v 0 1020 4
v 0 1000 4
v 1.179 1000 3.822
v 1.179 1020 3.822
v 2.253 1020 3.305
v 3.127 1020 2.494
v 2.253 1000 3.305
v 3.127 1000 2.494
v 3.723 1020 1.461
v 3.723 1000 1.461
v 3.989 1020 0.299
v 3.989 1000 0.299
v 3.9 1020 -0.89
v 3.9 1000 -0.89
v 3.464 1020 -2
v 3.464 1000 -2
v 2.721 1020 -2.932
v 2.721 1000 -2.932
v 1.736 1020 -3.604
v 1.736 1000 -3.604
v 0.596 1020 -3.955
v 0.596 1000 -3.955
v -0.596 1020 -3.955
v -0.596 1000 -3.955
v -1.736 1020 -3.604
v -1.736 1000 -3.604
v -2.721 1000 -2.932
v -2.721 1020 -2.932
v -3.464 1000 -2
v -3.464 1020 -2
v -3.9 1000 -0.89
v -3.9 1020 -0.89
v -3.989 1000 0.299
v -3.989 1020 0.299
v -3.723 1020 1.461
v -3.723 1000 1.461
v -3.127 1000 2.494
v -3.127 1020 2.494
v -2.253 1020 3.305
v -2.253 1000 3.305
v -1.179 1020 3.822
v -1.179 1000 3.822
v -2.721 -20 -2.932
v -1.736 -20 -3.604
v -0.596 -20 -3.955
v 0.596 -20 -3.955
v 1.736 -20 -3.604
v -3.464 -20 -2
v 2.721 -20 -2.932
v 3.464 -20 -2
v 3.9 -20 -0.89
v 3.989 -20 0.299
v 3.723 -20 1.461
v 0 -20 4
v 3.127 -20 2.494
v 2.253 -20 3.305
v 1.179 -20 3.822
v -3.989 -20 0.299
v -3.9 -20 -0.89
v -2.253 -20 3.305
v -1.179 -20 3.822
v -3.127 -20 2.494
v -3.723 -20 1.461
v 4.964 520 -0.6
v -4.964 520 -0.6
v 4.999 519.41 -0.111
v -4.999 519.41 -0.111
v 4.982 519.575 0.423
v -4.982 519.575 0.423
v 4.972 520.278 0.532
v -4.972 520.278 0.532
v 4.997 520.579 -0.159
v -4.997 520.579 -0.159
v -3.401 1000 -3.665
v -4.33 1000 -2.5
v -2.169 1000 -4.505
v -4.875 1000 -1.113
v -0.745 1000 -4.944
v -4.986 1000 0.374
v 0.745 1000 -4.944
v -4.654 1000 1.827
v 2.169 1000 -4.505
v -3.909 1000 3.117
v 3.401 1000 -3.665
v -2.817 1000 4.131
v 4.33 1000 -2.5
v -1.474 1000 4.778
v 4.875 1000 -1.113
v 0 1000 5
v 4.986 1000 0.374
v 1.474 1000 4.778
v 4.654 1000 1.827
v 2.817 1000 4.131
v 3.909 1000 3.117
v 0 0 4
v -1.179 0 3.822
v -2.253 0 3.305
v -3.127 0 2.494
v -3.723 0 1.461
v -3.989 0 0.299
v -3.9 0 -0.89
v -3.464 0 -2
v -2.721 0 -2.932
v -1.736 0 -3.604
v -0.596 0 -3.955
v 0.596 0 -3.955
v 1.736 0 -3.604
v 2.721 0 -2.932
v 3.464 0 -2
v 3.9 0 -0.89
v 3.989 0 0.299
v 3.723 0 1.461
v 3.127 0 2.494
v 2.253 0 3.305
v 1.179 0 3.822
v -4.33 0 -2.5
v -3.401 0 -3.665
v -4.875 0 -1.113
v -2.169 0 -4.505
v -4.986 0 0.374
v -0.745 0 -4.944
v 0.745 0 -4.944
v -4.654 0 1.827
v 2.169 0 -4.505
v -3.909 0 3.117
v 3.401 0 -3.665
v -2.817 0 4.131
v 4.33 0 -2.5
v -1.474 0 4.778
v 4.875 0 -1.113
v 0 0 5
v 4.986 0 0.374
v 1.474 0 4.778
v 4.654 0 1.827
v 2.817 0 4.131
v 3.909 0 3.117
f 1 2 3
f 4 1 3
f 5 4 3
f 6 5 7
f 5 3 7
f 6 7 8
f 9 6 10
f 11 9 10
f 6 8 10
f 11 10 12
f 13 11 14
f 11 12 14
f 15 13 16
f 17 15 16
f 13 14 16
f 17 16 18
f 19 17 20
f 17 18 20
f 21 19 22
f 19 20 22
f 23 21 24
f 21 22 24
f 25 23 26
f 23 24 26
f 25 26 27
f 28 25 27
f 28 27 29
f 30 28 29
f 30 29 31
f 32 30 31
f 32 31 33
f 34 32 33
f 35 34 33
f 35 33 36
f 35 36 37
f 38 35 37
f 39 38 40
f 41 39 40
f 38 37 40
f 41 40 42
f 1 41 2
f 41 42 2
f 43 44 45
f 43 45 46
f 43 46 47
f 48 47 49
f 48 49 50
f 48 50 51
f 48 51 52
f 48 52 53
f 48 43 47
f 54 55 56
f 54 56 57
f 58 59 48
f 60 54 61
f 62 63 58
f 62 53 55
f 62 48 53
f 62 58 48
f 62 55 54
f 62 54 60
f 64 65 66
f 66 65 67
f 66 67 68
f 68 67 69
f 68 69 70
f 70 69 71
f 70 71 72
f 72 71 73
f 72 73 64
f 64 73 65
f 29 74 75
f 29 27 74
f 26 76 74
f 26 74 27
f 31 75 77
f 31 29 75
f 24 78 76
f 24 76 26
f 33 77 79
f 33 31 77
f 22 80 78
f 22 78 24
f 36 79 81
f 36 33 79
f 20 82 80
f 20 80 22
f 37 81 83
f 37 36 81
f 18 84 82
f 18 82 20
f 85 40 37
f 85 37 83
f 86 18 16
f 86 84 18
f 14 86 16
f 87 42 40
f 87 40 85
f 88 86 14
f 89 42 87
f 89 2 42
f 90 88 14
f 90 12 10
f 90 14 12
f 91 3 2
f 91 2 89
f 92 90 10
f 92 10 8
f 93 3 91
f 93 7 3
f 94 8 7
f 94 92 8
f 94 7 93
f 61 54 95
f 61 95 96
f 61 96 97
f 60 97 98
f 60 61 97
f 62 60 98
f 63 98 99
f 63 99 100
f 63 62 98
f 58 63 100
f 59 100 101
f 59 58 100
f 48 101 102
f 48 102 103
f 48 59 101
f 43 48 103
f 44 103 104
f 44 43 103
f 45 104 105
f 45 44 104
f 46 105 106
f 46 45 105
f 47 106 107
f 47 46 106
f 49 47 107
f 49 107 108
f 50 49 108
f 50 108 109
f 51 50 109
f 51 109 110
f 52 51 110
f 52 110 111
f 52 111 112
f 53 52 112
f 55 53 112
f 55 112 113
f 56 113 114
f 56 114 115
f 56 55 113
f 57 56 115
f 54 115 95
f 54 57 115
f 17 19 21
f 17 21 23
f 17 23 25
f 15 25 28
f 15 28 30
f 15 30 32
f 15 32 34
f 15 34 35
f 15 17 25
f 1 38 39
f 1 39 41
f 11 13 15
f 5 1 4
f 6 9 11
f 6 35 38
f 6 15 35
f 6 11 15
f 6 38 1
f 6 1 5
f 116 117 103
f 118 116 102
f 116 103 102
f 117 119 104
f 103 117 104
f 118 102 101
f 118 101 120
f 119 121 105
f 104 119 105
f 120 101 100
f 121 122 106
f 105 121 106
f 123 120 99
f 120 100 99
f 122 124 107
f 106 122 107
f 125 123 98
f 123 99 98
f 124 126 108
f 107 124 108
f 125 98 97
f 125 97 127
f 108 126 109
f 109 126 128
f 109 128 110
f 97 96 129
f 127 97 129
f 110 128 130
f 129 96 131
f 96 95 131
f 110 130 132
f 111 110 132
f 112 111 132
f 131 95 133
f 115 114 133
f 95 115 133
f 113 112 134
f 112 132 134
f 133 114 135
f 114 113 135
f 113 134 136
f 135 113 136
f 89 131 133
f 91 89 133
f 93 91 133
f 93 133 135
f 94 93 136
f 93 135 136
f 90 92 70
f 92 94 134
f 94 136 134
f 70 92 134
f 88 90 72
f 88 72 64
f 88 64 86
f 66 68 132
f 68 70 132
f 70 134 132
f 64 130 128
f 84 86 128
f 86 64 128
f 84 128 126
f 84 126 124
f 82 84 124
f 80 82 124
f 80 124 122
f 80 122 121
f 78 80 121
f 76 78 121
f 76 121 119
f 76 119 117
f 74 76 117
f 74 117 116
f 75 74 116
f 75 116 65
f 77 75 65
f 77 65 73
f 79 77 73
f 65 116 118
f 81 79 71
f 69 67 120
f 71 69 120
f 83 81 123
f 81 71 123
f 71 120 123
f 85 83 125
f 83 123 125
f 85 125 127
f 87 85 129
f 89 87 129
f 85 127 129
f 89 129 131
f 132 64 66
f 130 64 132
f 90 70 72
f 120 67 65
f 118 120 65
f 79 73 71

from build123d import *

# Parameters (mm, degrees)
ESQUISSE1_R        = 5
BOSS_EXTRU_1_DEPTH = 1000
ESQUISSE2_R        = 4
BOSS_EXTRU_2_DEPTH = 20
BOSS_EXTRU_3_START = 20
ESQUISSE3_R        = 4
BOSS_EXTRU_3_DEPTH = 20
D_GAGEMENT_M11_D   = 1.2


with BuildPart() as part:
    # Esquisse1 → Boss.-Extru.1 (new body)
    with BuildSketch(Plane(origin=(0, 0, 0), x_dir=(1, 0, 0), z_dir=(0, 1, 0))):
        with Locations(Location((0, 0, 0), (0, 0, 270))):
            Circle(ESQUISSE1_R)
    extrude(amount=BOSS_EXTRU_1_DEPTH)

    # Esquisse2 → Boss.-Extru.2 (add)
    with BuildSketch(Plane(origin=(0, 1000, 0), x_dir=(1, 0, 0), z_dir=(0, 1, 0))):
        with Locations(Location((0, 0, 0), (0, 0, 270))):
            Circle(ESQUISSE2_R)
    extrude(amount=BOSS_EXTRU_2_DEPTH)

    # Esquisse3 → Boss.-Extru.3 (add)
    with BuildSketch(Plane(origin=(0, 0, 0), x_dir=(-1, 0, 0), z_dir=(0, -1, 0)).offset(BOSS_EXTRU_3_START)):
        with Locations(Location((0, 0, 0), (0, 0, 270))):
            Circle(ESQUISSE3_R)
    extrude(amount=-BOSS_EXTRU_3_DEPTH)

    # Dégagement M11 (through all)
    with Locations(Plane(origin=(5, 520, 0), x_dir=(0, 0, 1), z_dir=(1, 0, 0))):
        with Locations((0, 0)):
            Hole(D_GAGEMENT_M11_D / 2)


solid = part.part
